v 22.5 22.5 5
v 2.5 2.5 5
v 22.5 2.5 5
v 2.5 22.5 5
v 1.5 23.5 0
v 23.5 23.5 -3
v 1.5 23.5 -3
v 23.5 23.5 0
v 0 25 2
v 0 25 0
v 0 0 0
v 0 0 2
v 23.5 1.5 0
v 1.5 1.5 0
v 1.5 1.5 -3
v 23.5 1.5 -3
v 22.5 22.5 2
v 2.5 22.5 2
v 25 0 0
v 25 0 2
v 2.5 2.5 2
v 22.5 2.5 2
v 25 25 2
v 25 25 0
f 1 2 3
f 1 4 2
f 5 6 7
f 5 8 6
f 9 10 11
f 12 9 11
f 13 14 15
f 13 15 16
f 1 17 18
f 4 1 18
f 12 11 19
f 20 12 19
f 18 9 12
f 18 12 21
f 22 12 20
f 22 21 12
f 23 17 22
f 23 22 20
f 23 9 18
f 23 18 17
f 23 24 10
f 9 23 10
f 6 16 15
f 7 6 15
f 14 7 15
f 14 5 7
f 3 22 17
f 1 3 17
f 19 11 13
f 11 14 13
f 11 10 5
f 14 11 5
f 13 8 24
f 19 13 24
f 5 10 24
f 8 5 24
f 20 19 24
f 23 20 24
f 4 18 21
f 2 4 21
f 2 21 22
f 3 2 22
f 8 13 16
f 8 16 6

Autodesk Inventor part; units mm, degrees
ref_plane "YZ Plane" through (0, 0, 0) normal (1, 0, 0) x (0, 1, 0)
ref_plane "XZ Plane" through (0, 0, 0) normal (0, 1, 0) x (-1, 0, 0)
ref_plane "XY Plane" through (0, 0, 0) normal (0, 0, 1) x (1, 0, 0)
sketch "Sketch1" plane through (0, 0, 0) normal (0, 0, 1) x (1, 0, 0)
  line L0 (0, 0) -> (25, 0)
  line L1 (25, 0) -> (25, 25)
  line L2 (25, 25) -> (0, 25)
  line L3 (0, 25) -> (0, 0)
  dimension "d0" = 25
  dimension "d1" = 25
extrude "Extrusion1" add sketch "Sketch1" along normal blind 2
sketch "Sketch2" plane through (0, 0, 2) normal (0, 0, 1) x (1, 0, 0)
  line L0 (0, 0) -> (0, 25) projected
  line L1 (0, 25) -> (25, 25) projected
  line L2 (2.5, 2.5) -> (22.5, 2.5)
  line L3 (22.5, 2.5) -> (22.5, 22.5)
  line L4 (22.5, 22.5) -> (2.5, 22.5)
  line L5 (2.5, 22.5) -> (2.5, 2.5)
  dimension "d4" = 20
  dimension "d5" = 20
  dimension "d6" = 2.5
  dimension "d7" = 2.5
extrude "Extrusion2" add sketch "Sketch2" along normal blind 3
sketch "Sketch3" plane through (0, 0, 0) normal (0, 0, -1) x (-1, 0, 0)
  line L0 (-25, 25) -> (0, 25) projected
  line L1 (-25, 0) -> (-25, 25) projected
  line L2 (-23.5, 23.5) -> (-1.5, 23.5)
  line L3 (-1.5, 23.5) -> (-1.5, 1.5)
  line L4 (-1.5, 1.5) -> (-23.5, 1.5)
  line L5 (-23.5, 1.5) -> (-23.5, 23.5)
  dimension "d10" = 22
  dimension "d11" = 22
  dimension "d12" = 1.5
  dimension "d13" = 1.5
extrude "Extrusion3" add sketch "Sketch3" along normal blind 3
properties part number "antena_gps"
